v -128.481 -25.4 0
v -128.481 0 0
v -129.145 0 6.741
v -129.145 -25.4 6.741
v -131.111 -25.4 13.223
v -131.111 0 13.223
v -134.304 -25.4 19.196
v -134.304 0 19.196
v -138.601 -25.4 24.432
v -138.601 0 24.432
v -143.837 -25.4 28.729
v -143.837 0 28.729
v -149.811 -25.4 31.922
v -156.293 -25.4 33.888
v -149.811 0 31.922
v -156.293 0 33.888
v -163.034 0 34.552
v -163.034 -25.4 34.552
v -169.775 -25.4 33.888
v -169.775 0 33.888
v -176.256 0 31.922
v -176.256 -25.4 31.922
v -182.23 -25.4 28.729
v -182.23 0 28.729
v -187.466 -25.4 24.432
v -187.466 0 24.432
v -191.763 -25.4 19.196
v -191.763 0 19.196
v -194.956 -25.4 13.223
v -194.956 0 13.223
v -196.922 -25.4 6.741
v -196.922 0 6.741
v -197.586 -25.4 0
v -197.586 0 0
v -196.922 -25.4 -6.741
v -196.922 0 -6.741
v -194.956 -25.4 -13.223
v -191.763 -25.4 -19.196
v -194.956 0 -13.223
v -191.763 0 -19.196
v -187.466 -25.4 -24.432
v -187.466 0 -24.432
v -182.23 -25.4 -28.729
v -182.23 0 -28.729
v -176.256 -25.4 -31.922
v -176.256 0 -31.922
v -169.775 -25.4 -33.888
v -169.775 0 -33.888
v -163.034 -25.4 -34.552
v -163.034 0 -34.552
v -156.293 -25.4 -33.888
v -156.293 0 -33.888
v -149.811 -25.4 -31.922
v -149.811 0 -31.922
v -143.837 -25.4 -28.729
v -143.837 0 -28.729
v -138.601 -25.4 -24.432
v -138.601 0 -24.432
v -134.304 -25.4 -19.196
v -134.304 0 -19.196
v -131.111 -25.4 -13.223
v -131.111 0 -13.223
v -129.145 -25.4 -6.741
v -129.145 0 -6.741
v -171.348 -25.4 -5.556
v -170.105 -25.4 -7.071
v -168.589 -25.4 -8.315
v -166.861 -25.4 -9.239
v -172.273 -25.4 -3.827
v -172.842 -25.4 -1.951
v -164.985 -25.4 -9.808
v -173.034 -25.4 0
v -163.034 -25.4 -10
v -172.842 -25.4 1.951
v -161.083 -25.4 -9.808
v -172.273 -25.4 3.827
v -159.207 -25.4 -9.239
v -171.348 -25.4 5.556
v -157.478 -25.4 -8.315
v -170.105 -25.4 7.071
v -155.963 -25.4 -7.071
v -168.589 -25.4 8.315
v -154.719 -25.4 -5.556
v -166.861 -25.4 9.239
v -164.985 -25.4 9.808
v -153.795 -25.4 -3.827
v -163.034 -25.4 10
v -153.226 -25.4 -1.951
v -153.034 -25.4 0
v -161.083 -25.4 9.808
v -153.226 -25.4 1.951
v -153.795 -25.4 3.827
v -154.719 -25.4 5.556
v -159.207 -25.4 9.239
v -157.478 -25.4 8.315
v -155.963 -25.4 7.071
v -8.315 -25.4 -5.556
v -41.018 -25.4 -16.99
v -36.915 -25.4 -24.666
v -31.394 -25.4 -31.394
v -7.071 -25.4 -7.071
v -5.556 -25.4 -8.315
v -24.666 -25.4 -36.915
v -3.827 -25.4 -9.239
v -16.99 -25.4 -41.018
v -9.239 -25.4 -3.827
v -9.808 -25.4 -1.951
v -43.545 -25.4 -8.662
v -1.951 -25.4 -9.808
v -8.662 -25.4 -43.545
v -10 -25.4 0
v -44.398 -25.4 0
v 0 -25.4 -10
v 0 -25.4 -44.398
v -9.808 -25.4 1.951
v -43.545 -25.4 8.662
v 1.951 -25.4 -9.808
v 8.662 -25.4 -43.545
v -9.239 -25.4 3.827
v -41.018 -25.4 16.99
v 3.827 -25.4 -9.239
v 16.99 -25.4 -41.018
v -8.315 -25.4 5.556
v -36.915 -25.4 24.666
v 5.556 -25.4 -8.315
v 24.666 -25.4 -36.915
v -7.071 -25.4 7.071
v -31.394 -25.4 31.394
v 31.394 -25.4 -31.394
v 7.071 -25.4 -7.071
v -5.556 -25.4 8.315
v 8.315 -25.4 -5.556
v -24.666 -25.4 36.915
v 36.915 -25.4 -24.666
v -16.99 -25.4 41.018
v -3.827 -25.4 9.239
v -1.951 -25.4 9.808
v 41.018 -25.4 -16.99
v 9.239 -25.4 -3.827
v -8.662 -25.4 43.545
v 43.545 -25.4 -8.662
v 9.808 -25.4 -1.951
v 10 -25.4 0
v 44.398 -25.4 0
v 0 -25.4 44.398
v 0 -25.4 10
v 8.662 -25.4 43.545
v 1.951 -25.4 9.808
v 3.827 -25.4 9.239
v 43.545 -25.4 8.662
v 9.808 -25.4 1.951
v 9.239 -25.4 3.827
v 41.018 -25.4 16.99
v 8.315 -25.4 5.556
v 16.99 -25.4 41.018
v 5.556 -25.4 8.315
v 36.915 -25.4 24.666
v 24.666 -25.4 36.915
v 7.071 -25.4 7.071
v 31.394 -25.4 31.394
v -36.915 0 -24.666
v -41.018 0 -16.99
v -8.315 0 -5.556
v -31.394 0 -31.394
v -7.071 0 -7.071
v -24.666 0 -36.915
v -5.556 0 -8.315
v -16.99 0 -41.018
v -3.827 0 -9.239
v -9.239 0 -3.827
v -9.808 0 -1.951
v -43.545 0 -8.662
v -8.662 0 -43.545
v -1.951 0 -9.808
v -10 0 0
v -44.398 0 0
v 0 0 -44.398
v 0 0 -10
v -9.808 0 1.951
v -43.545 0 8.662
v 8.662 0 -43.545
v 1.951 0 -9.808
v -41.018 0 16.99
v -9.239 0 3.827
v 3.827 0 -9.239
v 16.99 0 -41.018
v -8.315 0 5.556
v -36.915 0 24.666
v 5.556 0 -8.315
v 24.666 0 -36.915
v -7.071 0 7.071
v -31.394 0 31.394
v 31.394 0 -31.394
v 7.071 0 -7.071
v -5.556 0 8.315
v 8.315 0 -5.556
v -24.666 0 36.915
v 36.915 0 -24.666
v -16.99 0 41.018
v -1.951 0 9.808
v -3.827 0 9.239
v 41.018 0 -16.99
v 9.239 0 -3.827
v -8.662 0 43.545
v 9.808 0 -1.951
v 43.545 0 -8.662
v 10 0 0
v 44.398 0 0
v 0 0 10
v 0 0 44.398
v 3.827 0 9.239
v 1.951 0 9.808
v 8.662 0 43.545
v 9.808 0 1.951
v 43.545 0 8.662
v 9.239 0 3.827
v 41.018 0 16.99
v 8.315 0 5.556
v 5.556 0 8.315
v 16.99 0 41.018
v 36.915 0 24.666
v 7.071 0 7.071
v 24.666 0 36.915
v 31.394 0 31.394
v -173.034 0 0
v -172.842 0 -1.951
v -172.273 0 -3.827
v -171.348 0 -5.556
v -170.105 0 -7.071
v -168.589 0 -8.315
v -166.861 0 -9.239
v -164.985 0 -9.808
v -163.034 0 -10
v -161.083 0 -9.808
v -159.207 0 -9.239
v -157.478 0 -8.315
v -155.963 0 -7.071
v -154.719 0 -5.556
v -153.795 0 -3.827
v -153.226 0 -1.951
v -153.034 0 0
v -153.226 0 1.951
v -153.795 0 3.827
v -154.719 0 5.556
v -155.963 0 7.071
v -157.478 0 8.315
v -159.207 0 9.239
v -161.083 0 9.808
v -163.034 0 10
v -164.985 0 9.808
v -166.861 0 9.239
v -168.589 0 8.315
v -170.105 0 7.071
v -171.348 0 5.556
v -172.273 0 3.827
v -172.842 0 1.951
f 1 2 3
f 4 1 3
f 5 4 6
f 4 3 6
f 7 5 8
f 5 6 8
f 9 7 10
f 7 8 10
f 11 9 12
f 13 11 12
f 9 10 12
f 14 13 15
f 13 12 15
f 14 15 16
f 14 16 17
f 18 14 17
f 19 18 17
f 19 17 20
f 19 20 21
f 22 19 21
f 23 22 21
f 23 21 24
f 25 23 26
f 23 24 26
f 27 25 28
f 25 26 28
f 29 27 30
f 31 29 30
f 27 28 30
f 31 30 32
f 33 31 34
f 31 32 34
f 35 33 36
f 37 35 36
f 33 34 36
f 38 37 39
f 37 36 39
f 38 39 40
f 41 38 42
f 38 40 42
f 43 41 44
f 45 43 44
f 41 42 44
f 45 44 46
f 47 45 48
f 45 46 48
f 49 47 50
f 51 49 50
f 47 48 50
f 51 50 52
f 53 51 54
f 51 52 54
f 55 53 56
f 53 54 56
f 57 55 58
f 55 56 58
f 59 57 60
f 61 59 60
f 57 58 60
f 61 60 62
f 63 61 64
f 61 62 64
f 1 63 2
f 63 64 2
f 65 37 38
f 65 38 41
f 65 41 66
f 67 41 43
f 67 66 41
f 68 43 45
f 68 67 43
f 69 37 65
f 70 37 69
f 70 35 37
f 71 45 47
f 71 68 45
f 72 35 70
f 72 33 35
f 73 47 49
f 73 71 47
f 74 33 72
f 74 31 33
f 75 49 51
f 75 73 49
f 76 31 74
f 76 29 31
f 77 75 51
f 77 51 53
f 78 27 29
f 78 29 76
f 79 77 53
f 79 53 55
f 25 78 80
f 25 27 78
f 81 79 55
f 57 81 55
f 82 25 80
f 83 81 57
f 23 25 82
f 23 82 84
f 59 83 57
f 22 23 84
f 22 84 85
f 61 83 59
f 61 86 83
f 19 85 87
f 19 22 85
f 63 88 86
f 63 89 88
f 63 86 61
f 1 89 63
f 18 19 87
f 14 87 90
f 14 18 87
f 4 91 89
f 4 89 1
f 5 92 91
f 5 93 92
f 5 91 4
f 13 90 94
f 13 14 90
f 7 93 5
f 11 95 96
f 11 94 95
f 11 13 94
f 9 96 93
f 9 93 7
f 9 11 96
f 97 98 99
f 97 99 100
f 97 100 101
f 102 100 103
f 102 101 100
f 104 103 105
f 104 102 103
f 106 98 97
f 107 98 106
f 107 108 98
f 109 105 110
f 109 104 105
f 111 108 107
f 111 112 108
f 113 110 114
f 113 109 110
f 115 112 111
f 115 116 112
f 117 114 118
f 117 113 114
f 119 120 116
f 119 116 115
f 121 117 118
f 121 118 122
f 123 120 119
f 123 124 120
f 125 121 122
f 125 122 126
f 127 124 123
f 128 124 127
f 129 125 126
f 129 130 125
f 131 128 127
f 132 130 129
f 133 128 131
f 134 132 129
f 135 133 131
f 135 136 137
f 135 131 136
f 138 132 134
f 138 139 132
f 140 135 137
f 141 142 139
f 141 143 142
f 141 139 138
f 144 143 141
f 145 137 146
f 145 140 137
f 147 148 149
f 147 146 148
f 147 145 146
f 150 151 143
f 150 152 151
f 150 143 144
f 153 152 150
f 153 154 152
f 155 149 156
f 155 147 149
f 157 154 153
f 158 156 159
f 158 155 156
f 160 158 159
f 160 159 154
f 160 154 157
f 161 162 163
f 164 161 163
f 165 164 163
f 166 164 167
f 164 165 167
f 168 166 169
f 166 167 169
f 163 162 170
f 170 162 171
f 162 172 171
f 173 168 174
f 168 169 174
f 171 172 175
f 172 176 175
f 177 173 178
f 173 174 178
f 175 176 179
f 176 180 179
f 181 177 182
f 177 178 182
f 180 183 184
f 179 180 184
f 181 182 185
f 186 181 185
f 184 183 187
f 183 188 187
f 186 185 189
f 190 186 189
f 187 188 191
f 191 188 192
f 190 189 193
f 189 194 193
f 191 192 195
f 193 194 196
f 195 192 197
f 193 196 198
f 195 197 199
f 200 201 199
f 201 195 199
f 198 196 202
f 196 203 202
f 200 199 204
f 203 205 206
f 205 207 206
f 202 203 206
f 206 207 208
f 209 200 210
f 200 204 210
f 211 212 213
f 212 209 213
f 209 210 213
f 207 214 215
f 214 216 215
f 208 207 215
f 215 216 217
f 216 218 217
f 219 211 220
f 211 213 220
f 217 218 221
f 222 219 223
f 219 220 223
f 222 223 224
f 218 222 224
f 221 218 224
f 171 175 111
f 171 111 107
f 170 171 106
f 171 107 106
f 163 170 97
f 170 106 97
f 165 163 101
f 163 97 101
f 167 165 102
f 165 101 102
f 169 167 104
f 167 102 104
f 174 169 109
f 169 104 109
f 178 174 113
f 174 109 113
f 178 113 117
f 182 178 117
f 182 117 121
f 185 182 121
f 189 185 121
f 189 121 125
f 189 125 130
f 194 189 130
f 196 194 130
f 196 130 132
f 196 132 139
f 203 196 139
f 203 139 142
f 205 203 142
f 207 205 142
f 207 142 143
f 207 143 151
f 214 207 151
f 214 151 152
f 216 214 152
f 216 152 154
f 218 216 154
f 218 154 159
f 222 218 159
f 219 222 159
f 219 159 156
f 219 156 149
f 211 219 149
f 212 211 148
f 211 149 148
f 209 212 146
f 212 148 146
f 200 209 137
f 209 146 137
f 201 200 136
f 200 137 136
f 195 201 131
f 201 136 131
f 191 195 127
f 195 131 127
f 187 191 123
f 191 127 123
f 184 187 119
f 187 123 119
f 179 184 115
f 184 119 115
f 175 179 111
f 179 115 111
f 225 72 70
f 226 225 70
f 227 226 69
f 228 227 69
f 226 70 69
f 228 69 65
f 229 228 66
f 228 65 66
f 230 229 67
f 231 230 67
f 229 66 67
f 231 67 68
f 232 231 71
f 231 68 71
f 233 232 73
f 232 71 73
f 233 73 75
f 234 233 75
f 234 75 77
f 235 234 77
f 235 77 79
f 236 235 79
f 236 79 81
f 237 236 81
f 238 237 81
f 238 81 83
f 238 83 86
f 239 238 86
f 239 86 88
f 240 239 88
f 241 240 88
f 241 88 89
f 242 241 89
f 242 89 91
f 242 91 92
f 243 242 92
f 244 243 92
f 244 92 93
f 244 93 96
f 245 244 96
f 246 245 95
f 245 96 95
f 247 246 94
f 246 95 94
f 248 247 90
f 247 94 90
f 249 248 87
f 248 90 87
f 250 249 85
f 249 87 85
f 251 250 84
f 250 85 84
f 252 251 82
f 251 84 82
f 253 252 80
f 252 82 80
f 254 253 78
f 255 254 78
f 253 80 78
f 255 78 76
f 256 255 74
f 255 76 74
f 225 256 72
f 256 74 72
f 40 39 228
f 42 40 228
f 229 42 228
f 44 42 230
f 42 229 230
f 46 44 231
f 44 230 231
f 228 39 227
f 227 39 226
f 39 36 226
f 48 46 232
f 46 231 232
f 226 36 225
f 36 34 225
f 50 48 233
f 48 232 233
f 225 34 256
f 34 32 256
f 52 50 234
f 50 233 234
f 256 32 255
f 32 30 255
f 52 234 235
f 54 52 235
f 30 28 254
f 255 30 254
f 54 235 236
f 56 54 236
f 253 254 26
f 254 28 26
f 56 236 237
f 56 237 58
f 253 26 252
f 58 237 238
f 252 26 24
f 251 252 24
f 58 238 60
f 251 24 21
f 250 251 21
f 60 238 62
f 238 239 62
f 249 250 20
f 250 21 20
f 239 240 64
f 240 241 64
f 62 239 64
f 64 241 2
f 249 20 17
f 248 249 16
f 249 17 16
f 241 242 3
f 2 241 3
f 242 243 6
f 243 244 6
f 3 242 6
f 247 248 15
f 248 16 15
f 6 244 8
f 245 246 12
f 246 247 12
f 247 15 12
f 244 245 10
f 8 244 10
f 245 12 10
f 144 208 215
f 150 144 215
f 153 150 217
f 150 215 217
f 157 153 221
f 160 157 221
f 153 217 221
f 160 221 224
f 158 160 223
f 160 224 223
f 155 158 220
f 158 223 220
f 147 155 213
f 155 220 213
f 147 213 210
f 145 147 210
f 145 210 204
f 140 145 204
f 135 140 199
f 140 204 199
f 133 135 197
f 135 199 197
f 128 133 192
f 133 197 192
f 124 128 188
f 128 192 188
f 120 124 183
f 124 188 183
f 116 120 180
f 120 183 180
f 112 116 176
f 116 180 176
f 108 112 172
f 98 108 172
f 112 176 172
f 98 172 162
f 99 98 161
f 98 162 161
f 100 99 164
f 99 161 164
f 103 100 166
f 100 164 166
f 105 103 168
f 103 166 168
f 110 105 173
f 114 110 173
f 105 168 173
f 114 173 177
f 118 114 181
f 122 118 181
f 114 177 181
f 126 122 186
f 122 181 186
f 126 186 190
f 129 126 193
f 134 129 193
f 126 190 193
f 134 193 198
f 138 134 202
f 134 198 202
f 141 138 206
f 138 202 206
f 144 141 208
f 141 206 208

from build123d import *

# Parameters (mm, degrees)
F1_R     = 44.3976733483
F2_DEPTH = 25.4
F3_D     = 20
F4_R     = 34.552404507
F5_DEPTH = 25.4
F6_D     = 20


with BuildPart() as f2:
    # F1 (on face) → F2 (new body)
    with BuildSketch(Plane.XZ):
        Circle(F1_R)
    extrude(amount=F2_DEPTH)

    # F3 (through all)
    with Locations(Plane(origin=(0, 0, 0), x_dir=(1, 0, 0), z_dir=(0, 1, 0))):
        with Locations((0, 0)):
            Hole(F3_D / 2)


with BuildPart() as f5:
    # F4 (on Front) → F5 (new body)
    with BuildSketch(Plane.XZ):
        with Locations((-163.0337238312, 0)):
            Circle(F4_R)
    extrude(amount=F5_DEPTH)

    # F6 (through all)
    with Locations(Plane(origin=(0, 0, 0), x_dir=(1, 0, 0), z_dir=(0, 1, 0))):
        with Locations((-163.0337238312, 0)):
            Hole(F6_D / 2)


solid = Compound([f2.part, f5.part])
